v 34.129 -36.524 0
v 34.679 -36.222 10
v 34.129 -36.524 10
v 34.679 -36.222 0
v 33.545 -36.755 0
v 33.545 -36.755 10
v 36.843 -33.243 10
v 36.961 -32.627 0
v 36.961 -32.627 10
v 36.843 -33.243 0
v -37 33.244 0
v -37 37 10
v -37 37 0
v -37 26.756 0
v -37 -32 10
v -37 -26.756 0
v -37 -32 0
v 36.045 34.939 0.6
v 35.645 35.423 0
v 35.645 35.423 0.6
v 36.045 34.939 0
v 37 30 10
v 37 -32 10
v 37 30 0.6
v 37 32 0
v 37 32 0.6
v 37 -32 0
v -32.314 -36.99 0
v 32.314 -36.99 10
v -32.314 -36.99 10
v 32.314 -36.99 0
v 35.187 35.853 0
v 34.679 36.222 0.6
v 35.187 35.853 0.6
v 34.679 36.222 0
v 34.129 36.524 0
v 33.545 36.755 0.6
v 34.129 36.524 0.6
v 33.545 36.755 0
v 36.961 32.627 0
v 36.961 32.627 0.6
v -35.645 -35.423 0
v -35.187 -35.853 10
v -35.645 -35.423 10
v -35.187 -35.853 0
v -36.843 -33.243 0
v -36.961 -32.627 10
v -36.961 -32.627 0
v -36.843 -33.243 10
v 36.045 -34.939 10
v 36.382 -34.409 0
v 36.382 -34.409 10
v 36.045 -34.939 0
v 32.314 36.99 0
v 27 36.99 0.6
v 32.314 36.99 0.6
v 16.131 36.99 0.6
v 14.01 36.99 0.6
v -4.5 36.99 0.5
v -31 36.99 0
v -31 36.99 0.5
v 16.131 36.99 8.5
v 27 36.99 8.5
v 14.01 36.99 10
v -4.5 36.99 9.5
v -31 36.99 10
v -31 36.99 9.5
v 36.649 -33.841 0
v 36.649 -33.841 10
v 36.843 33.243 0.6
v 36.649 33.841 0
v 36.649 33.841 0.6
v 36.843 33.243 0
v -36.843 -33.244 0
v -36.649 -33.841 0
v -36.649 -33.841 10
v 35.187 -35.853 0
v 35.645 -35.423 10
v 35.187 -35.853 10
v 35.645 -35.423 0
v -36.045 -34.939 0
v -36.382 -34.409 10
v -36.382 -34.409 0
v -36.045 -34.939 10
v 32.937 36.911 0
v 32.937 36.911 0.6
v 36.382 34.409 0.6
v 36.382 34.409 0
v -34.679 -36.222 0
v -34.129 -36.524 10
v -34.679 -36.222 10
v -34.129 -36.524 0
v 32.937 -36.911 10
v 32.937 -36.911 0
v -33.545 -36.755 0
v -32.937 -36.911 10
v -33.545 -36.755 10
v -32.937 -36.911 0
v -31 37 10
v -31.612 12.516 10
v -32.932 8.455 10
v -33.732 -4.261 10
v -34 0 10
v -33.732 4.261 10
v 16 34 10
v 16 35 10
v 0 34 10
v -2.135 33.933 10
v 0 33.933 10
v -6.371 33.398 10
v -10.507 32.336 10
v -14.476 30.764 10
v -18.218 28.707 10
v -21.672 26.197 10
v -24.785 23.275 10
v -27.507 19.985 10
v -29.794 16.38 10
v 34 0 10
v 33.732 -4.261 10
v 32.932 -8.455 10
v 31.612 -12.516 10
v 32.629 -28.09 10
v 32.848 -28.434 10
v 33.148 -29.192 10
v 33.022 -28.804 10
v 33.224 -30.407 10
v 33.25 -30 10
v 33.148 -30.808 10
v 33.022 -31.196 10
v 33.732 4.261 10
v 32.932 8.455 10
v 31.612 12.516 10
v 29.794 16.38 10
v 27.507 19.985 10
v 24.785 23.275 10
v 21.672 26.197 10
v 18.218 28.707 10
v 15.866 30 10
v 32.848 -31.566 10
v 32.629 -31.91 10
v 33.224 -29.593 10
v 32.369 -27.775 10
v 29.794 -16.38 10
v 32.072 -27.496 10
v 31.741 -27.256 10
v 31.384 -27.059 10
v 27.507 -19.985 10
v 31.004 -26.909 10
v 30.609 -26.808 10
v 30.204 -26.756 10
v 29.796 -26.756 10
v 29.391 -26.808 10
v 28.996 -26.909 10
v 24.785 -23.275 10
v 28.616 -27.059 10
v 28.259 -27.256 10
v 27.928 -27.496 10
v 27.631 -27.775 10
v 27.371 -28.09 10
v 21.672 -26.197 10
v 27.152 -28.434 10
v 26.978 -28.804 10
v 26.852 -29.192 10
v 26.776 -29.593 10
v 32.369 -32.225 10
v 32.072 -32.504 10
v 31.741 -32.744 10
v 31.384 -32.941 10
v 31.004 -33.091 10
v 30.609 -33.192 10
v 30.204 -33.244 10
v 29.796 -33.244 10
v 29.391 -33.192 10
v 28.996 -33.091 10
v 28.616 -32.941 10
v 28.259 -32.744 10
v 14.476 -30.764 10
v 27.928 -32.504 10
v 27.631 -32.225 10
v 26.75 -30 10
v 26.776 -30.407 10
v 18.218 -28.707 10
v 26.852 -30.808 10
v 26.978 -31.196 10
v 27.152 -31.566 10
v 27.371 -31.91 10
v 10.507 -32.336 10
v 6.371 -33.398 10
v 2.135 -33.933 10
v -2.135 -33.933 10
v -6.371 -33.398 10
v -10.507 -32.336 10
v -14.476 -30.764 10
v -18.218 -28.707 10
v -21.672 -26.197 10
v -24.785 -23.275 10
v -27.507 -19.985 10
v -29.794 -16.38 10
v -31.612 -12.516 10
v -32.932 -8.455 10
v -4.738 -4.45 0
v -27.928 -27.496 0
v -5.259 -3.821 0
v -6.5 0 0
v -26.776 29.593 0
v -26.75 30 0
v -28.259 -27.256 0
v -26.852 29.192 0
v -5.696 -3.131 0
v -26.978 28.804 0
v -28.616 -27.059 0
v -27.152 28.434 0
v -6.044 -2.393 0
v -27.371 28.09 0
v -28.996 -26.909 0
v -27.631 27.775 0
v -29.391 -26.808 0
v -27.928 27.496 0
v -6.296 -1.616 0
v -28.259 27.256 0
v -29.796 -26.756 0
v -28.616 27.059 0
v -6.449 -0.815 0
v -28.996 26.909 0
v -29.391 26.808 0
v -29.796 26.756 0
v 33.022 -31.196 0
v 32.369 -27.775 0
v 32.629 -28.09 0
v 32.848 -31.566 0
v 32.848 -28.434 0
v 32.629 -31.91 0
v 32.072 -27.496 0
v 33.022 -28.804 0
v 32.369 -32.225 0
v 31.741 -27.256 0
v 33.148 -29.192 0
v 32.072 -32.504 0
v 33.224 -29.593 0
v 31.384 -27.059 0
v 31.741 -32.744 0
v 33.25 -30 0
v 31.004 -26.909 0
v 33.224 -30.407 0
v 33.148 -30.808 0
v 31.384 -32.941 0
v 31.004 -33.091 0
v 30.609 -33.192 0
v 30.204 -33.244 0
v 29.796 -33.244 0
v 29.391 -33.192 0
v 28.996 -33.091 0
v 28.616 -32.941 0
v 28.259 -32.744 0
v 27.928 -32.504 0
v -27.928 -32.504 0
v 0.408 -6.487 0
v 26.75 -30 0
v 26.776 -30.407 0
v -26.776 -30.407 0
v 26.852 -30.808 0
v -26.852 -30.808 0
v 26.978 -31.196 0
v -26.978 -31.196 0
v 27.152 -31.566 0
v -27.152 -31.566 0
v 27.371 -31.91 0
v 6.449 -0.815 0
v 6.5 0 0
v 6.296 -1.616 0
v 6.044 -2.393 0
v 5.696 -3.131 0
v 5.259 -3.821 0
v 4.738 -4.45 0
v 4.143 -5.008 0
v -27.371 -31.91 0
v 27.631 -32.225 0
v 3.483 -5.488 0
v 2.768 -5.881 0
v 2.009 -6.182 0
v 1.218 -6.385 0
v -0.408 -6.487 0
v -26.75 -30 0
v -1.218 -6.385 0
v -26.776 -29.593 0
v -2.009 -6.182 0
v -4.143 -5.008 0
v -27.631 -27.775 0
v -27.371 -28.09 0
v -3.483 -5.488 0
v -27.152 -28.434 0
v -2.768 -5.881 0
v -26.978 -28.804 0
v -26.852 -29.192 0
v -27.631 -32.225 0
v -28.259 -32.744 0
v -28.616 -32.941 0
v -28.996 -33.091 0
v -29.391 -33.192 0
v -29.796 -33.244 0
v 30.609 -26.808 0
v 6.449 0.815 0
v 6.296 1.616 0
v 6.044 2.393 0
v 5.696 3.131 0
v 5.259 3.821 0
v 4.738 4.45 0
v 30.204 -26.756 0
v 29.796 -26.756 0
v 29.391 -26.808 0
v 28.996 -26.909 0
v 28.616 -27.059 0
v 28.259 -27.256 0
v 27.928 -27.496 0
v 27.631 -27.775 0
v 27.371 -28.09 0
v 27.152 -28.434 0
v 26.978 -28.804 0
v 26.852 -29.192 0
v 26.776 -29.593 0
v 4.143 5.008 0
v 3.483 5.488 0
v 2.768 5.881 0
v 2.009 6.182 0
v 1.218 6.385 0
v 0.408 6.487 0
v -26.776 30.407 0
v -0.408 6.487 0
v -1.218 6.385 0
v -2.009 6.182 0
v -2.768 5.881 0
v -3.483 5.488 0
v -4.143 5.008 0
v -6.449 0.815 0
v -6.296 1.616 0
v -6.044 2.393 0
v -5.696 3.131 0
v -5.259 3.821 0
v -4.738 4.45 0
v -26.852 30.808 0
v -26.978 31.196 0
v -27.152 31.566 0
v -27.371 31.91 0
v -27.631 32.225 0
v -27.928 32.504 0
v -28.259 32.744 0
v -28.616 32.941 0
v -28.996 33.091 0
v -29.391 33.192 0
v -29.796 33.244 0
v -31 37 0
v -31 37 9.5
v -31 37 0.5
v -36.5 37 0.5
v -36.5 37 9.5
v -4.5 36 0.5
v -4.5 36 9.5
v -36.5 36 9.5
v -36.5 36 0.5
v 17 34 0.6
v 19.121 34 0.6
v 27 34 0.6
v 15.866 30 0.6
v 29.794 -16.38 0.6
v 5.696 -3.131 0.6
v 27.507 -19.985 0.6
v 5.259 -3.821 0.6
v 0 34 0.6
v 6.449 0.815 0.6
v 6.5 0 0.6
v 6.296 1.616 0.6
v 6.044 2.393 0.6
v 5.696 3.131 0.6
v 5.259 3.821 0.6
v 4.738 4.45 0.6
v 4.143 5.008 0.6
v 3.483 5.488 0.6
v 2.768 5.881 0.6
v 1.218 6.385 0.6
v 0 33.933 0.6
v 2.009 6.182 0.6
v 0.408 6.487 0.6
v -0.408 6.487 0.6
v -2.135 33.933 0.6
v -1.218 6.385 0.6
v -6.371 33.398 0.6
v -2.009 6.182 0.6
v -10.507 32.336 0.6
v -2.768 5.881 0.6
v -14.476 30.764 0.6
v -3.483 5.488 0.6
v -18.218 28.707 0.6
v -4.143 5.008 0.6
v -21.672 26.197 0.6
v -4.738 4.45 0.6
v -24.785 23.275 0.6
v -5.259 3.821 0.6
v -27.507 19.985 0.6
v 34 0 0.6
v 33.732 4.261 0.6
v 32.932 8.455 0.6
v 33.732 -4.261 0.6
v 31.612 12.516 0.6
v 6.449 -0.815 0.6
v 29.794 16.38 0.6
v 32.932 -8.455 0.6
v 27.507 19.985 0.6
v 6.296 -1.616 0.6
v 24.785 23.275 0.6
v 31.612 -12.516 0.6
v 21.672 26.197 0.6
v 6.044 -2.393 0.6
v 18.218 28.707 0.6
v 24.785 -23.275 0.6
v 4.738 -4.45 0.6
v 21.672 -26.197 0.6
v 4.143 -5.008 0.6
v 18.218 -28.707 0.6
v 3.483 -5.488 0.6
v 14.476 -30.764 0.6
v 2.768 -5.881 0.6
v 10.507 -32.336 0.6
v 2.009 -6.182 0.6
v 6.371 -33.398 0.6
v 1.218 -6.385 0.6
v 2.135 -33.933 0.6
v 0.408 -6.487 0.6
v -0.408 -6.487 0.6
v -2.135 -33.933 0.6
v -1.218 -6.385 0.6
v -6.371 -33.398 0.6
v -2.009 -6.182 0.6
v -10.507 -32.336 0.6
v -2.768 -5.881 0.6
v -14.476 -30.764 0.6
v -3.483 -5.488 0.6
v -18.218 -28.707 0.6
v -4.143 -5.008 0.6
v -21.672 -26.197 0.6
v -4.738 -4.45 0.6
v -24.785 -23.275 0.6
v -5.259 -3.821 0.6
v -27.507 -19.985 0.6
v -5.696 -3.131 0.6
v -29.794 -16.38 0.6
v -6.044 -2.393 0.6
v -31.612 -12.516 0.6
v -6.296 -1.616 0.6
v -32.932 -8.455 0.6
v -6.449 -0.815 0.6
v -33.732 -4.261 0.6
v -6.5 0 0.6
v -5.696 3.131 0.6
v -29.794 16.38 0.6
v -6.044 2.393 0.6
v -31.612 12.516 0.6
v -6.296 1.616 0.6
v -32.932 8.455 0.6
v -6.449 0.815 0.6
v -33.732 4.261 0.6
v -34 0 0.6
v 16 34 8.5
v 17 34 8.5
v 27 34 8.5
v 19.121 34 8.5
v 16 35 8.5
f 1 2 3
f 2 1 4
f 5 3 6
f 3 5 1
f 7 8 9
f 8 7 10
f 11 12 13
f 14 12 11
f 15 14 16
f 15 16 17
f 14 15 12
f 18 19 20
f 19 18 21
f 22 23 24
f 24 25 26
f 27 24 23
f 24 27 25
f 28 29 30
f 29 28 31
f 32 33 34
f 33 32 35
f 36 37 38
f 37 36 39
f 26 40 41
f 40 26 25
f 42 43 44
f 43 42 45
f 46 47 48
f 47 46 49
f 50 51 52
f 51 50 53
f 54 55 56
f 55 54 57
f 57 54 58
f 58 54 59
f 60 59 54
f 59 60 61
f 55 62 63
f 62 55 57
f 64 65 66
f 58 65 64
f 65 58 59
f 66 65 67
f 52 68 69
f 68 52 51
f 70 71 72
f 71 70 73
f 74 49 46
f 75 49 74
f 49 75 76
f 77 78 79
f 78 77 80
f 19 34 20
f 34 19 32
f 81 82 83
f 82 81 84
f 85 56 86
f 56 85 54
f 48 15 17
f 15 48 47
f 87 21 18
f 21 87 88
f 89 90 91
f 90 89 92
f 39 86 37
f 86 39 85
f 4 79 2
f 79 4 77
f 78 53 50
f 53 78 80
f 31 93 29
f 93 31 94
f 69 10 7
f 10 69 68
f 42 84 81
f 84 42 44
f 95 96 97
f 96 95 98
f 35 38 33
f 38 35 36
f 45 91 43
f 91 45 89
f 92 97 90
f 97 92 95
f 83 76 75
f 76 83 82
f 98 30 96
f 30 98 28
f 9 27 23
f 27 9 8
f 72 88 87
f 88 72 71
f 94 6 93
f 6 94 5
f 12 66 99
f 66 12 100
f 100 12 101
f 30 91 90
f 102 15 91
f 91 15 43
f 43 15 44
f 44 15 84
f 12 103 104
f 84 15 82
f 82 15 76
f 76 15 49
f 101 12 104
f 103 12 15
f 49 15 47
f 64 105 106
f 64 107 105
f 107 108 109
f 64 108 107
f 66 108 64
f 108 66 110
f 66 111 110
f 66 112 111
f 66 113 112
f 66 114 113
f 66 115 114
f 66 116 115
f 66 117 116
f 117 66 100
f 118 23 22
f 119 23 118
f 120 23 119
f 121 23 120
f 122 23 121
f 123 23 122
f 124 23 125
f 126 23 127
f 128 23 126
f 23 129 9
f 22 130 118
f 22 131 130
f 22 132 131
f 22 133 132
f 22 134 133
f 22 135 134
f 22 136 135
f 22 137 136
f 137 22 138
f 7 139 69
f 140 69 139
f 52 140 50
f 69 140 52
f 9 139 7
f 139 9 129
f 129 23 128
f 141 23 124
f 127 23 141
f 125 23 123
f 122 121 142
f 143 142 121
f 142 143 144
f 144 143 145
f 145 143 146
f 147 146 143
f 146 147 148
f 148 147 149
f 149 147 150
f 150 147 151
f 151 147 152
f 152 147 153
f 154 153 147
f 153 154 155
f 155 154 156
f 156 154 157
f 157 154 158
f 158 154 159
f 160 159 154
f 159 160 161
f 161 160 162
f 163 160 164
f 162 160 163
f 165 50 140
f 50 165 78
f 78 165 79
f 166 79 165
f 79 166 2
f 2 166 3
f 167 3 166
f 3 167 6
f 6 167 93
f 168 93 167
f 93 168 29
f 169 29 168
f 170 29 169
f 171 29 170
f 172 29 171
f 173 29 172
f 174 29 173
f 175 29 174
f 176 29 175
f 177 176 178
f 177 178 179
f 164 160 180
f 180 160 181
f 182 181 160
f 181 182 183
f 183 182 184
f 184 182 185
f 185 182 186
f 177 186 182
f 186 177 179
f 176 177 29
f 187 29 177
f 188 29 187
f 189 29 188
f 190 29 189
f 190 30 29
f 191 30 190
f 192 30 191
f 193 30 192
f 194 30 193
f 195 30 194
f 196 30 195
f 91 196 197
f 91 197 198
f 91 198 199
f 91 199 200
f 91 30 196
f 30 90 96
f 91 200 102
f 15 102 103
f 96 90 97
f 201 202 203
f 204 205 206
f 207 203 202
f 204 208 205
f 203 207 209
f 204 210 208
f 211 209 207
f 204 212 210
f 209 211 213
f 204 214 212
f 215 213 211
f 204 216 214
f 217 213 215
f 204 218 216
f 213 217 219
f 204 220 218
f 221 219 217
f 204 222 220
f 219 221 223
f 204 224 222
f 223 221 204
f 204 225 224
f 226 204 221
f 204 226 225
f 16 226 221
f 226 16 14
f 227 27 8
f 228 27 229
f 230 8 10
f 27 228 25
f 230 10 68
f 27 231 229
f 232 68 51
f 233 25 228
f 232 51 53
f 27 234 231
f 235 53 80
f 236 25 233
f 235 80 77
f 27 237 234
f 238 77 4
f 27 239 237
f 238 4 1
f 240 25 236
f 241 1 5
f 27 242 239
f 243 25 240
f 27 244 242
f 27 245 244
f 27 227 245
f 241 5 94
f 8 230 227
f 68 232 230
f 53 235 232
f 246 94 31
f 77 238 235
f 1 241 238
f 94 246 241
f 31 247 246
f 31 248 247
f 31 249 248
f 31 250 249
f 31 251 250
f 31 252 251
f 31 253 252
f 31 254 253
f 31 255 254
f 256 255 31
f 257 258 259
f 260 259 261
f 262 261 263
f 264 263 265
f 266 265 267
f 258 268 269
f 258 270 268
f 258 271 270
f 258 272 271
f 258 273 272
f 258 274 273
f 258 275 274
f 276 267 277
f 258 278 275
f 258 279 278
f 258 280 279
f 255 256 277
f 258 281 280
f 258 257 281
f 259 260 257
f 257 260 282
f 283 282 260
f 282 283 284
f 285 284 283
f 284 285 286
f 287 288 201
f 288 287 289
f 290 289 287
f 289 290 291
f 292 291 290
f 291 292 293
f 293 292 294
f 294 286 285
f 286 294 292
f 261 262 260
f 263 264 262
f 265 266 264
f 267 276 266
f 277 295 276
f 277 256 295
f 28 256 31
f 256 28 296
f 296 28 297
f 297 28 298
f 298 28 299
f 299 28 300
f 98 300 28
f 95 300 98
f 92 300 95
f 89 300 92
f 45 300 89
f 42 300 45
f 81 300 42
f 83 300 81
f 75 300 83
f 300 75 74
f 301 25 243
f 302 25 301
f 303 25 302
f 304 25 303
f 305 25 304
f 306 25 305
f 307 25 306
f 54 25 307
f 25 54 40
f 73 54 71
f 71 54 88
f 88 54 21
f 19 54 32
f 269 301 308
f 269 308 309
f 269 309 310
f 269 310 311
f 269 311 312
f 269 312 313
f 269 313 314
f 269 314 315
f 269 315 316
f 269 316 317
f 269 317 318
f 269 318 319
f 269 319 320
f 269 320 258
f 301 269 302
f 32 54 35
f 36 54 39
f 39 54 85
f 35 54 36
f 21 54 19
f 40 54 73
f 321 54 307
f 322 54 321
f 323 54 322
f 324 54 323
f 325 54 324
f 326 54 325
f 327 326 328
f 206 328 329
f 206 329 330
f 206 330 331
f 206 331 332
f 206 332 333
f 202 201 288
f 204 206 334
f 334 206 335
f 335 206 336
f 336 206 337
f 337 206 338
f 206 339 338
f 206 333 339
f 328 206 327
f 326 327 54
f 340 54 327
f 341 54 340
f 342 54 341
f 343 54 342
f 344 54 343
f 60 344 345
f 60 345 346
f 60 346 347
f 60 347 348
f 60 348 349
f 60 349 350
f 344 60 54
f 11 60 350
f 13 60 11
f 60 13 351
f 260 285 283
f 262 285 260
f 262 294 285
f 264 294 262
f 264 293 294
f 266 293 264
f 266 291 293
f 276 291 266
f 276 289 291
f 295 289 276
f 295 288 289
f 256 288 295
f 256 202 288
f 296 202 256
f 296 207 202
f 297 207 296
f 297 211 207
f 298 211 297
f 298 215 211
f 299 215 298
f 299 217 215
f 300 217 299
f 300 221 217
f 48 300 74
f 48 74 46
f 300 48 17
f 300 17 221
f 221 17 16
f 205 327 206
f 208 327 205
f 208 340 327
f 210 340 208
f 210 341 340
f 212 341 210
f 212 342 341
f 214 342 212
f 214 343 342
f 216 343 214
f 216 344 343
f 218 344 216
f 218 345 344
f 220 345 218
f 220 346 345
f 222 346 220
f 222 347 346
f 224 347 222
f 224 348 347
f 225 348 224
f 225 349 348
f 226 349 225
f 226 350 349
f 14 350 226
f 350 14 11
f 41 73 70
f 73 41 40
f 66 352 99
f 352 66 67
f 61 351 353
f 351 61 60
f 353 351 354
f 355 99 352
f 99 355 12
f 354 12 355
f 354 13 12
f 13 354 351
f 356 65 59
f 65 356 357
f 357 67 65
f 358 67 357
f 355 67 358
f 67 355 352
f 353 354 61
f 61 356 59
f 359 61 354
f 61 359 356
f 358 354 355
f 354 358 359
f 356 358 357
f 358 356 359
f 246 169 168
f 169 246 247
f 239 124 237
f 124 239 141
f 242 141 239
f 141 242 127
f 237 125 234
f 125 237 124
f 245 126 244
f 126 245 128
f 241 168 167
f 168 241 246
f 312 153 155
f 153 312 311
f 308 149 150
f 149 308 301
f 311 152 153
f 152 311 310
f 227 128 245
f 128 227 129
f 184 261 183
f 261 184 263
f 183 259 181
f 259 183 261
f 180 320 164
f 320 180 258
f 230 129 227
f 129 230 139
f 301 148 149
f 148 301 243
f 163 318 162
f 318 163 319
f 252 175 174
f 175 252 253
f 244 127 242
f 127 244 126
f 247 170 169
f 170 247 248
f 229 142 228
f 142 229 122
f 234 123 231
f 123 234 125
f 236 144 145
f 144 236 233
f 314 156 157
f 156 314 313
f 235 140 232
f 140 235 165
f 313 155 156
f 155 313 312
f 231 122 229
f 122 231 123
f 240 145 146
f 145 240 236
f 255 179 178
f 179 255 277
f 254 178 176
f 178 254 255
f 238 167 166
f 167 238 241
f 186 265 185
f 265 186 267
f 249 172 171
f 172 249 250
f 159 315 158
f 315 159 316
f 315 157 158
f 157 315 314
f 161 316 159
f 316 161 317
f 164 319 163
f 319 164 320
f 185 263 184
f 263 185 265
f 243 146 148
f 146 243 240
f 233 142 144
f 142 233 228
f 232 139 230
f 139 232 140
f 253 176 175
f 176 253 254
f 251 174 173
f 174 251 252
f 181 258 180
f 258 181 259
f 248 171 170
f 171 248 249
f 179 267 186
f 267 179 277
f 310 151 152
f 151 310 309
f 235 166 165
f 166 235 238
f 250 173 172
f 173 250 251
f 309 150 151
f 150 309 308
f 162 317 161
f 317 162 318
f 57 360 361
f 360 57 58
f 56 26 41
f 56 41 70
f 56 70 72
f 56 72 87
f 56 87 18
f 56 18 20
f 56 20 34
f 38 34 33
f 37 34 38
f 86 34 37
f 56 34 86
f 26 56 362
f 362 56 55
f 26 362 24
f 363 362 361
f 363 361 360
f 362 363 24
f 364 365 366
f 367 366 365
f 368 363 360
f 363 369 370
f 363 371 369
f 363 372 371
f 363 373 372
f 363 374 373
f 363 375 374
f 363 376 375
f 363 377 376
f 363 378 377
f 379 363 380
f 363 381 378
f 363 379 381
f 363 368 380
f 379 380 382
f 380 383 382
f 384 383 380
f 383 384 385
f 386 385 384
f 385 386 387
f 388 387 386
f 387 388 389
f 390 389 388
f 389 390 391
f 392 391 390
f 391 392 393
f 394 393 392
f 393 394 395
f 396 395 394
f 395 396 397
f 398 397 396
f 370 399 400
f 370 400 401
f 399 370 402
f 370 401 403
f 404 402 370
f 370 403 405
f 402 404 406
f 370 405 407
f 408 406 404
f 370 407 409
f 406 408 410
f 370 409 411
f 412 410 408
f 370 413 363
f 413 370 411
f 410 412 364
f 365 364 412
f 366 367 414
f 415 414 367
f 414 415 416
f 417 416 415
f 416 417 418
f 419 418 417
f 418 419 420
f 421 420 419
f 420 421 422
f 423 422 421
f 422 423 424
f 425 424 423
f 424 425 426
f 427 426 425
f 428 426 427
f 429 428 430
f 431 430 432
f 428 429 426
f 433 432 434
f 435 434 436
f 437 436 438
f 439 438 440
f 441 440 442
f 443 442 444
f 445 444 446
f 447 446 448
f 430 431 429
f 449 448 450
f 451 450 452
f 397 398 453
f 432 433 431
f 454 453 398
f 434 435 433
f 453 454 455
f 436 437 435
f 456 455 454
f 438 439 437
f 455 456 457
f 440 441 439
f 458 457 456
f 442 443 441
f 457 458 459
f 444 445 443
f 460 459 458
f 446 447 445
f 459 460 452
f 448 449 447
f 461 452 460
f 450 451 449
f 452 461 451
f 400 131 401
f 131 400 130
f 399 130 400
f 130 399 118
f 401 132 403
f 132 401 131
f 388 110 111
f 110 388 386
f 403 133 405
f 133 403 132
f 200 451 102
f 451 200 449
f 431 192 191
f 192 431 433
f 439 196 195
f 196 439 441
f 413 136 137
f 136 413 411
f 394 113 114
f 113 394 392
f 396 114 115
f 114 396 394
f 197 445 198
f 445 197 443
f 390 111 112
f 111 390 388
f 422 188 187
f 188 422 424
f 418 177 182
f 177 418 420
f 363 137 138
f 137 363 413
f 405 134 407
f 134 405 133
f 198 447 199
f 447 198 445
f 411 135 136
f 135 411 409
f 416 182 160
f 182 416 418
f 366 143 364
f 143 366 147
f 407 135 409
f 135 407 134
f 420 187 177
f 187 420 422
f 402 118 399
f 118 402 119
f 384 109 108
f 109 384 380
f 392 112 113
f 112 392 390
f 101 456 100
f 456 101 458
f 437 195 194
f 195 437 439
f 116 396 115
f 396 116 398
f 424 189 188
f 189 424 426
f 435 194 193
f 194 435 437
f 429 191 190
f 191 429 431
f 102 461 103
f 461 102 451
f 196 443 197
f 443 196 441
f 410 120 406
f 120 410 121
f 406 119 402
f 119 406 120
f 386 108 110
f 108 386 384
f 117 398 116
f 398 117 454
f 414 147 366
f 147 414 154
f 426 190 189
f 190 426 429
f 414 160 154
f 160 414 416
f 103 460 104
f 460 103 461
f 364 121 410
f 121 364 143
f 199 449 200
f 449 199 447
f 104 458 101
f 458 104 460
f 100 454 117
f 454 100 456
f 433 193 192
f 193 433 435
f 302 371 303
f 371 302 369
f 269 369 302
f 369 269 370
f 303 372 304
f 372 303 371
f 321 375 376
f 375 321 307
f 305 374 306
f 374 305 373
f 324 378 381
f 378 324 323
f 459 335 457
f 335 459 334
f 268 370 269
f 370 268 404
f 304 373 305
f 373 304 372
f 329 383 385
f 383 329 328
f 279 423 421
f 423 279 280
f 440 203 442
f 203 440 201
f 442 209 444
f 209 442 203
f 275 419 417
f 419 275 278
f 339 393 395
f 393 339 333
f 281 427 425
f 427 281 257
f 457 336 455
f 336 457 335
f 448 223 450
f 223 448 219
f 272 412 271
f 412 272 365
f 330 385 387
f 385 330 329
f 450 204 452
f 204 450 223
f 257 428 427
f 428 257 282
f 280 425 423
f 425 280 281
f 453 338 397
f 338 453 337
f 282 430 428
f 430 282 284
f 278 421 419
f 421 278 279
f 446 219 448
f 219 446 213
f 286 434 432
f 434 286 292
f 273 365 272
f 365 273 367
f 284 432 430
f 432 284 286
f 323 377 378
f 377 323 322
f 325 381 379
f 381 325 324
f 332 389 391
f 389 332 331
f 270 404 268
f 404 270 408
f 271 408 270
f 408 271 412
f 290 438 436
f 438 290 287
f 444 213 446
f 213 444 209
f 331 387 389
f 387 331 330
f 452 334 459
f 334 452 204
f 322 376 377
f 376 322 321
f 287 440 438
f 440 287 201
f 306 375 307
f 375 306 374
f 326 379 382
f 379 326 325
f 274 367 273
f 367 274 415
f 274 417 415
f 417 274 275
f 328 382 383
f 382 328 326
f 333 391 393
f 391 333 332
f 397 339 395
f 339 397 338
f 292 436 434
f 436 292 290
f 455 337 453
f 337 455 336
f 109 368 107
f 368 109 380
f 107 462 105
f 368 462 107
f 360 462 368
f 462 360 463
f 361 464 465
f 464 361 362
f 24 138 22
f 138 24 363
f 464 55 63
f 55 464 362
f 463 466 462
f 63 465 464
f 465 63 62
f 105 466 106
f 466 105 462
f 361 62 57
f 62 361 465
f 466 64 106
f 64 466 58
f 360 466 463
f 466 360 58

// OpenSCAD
$fn = 50;


difference() {
	union() {
		hull() {
			translate(v = [-32.0000000000, 32.0000000000, 0]) {
				cylinder(h = 10, r = 5);
			}
			translate(v = [32.0000000000, 32.0000000000, 0]) {
				cylinder(h = 10, r = 5);
			}
			translate(v = [-32.0000000000, -32.0000000000, 0]) {
				cylinder(h = 10, r = 5);
			}
			translate(v = [32.0000000000, -32.0000000000, 0]) {
				cylinder(h = 10, r = 5);
			}
		}
		translate(v = [-37.0000000000, 31.0000000000, 0]) {
			cube(size = [6, 6, 10]);
		}
	}
	union() {
		translate(v = [-37.5000000000, -30.0000000000, -250.0000000000]) {
			rotate(a = [0, 0, 0]) {
				difference() {
					union() {
						hull() {
							translate(v = [7.5000000000, 0, 0]) {
								cylinder(h = 250, r = 3.2500000000, r1 = 3.2500000000, r2 = 3.2500000000);
							}
							translate(v = [-7.5000000000, 0, 0]) {
								cylinder(h = 250, r = 3.2500000000, r1 = 3.2500000000, r2 = 3.2500000000);
							}
						}
					}
					union();
				}
			}
		}
		translate(v = [-37.5000000000, 30.0000000000, -250.0000000000]) {
			rotate(a = [0, 0, 0]) {
				difference() {
					union() {
						hull() {
							translate(v = [7.5000000000, 0, 0]) {
								cylinder(h = 250, r = 3.2500000000, r1 = 3.2500000000, r2 = 3.2500000000);
							}
							translate(v = [-7.5000000000, 0, 0]) {
								cylinder(h = 250, r = 3.2500000000, r1 = 3.2500000000, r2 = 3.2500000000);
							}
						}
					}
					union();
				}
			}
		}
		translate(v = [-36.5000000000, 36.0000000000, 0.5000000000]) {
			cube(size = [32, 1, 9.0000000000]);
		}
		translate(v = [30.0000000000, -30.0000000000, -50.0000000000]) {
			cylinder(h = 100, r = 3.2500000000);
		}
		translate(v = [0, 0, 0.6000000000]) {
			cylinder(h = 12.4000000000, r = 34.0000000000);
		}
		translate(v = [0, 0, -5.0000000000]) {
			cylinder(h = 10, r = 6.5000000000);
		}
		translate(v = [0.0000000000, 30.0000000000, 0.6000000000]) {
			cube(size = [37.0000000000, 4, 12.4000000000]);
		}
		translate(v = [27.0000000000, 30.0000000000, 0.6000000000]) {
			cube(size = [10, 7, 12.4000000000]);
		}
		translate(v = [16.0000000000, 30.0000000000, 8.5000000000]) {
			cube(size = [21, 7, 1.5000000000]);
		}
		translate(v = [13.2500000000, 37.7500000000, 0.6000000000]) {
			rotate(a = [0, 0, -45]) {
				cube(size = [7.5000000000, 1.5000000000, 12.4000000000]);
			}
		}
		translate(v = [7.0610000000, 28.0000000000, 0.6000000000]) {
			cube(size = [7.5000000000, 2, 9.4000000000]);
		}
	}
}
